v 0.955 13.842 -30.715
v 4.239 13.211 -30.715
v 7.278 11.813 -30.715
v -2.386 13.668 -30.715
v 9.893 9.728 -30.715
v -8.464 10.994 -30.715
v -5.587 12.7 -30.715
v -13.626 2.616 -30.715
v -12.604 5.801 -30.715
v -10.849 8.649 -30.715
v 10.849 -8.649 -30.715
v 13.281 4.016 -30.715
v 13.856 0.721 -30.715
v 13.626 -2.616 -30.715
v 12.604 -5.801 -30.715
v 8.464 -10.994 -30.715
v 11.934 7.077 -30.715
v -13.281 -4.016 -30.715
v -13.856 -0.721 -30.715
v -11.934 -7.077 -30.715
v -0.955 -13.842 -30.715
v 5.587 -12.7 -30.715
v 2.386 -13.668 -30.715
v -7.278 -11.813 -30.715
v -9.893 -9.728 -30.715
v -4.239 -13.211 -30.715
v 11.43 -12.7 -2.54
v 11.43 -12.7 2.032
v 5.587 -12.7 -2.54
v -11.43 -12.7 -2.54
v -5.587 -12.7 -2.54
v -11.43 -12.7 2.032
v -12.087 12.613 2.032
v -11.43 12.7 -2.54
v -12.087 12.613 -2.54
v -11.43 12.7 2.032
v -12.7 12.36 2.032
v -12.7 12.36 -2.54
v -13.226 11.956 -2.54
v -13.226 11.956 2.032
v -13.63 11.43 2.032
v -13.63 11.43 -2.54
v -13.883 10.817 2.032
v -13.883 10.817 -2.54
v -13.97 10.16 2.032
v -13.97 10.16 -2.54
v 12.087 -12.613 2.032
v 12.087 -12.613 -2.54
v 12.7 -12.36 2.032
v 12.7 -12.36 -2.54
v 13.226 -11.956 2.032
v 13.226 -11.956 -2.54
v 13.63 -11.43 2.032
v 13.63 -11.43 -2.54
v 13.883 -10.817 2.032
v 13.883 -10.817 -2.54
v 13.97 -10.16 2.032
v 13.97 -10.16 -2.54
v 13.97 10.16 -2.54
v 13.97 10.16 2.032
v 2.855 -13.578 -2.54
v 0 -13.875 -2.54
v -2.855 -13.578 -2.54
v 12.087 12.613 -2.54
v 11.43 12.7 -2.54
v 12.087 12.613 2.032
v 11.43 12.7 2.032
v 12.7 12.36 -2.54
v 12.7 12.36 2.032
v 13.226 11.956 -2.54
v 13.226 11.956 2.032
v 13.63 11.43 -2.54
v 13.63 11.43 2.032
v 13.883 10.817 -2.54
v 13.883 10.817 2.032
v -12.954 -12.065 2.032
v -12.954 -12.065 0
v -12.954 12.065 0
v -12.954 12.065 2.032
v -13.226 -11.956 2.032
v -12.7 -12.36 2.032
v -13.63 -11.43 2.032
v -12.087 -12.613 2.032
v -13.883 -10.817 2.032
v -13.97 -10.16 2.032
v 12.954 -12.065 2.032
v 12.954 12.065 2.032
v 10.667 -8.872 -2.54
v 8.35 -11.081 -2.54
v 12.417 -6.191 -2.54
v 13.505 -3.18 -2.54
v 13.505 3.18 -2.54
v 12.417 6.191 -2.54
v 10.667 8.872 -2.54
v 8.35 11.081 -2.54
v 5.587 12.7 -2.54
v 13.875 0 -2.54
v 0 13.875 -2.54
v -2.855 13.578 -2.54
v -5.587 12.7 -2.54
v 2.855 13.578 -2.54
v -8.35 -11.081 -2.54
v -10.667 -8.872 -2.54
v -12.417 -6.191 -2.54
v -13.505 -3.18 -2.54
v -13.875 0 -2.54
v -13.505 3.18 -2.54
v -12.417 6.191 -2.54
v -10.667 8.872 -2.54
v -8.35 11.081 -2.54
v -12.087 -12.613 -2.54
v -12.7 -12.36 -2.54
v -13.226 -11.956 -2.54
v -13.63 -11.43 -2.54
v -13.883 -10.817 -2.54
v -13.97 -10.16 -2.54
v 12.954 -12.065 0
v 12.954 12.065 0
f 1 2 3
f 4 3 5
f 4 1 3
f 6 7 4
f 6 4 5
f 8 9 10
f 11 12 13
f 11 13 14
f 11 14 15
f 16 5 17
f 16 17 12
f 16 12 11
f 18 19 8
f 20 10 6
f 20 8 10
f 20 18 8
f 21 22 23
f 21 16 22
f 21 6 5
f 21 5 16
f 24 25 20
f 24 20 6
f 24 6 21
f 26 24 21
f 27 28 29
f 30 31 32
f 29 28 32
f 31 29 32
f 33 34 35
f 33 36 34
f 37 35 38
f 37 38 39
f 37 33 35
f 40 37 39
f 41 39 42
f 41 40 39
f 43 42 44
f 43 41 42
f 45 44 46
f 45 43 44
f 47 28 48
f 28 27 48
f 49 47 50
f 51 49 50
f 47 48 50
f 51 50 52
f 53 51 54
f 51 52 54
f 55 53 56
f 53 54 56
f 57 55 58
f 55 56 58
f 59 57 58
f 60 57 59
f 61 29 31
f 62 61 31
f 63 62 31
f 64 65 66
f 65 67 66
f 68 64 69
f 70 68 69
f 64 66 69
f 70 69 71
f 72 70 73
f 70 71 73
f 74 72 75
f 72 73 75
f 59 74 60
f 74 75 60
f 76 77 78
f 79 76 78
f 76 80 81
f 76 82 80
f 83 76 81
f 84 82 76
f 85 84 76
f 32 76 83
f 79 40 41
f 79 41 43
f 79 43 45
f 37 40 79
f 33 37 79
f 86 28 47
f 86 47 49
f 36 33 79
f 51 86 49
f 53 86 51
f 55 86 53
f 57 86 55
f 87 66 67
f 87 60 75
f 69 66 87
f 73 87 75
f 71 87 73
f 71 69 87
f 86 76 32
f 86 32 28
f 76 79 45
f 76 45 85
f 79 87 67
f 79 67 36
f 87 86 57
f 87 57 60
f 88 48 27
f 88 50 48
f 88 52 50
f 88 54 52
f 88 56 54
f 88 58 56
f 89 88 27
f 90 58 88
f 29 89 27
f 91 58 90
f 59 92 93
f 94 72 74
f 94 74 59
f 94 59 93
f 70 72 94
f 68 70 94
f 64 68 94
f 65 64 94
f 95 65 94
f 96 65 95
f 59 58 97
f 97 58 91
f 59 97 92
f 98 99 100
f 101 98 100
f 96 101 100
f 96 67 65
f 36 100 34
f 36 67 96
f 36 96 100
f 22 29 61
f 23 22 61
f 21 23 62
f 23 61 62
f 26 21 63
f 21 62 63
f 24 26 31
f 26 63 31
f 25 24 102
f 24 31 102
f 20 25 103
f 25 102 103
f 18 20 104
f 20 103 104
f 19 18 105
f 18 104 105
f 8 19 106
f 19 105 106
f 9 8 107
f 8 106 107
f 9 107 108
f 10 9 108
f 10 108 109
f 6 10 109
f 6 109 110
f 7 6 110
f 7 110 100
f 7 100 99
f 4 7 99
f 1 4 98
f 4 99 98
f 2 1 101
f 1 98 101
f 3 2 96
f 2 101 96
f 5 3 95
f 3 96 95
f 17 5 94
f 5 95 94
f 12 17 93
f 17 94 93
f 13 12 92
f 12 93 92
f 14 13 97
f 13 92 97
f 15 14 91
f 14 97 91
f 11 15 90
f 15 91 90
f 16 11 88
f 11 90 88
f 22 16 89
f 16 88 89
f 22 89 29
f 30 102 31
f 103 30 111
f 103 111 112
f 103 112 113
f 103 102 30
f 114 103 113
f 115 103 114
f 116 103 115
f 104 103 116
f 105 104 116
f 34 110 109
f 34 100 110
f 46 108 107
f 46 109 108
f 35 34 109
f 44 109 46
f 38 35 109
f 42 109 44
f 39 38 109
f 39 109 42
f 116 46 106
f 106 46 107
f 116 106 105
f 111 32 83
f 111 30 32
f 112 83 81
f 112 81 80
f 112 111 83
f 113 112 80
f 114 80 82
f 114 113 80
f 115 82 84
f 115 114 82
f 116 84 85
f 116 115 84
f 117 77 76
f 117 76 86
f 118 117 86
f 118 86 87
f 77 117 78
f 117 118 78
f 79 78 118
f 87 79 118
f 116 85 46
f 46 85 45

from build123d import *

# Parameters (mm, degrees)
SKETCH2_W           = 27.94
SKETCH2_H           = 25.4
SKETCH2_W_2         = 25.908
SKETCH2_H_2         = 24.13
BOSS_EXTRUDE1_DEPTH = 2.032
SKETCH3_W           = 27.94
SKETCH3_H           = 25.4
BOSS_EXTRUDE2_DEPTH = 2.54
SKETCH4_R           = 13.87475
BOSS_EXTRUDE3_DEPTH = 28.175
FILLET1_R           = 2.54


with BuildPart() as part:
    # Sketch2 → Boss-Extrude1 (new body)
    with BuildSketch(Plane.XY):
        Rectangle(SKETCH2_W, SKETCH2_H)
        Rectangle(SKETCH2_W_2, SKETCH2_H_2, mode=Mode.SUBTRACT)
    extrude(amount=BOSS_EXTRUDE1_DEPTH)

    # Sketch3 → Boss-Extrude2 (add)
    with BuildSketch(Plane(origin=(0, 0, 0), x_dir=(-1, 0, 0), z_dir=(0, 0, -1))):
        Rectangle(SKETCH3_W, SKETCH3_H)
    extrude(amount=BOSS_EXTRUDE2_DEPTH)

    # Sketch4 → Boss-Extrude3 (add)
    with BuildSketch(Plane(origin=(0, 0, -2.54), x_dir=(-1, 0, 0), z_dir=(0, 0, -1))):
        with Locations(Location((0, 0, 0), (0, 0, 246.252892173))):
            Circle(SKETCH4_R)
    extrude(amount=BOSS_EXTRUDE3_DEPTH)

    # Fillet1
    fillet1_edges = [part.edges().sort_by_distance(p)[0] for p in [
        (-13.97, 12.7, -0.254),
        (13.97, 12.7, -0.254),
        (13.97, -12.7, -0.254),
        (-13.97, -12.7, -0.254),
    ]]
    fillet(fillet1_edges, radius=FILLET1_R)


solid = part.part
